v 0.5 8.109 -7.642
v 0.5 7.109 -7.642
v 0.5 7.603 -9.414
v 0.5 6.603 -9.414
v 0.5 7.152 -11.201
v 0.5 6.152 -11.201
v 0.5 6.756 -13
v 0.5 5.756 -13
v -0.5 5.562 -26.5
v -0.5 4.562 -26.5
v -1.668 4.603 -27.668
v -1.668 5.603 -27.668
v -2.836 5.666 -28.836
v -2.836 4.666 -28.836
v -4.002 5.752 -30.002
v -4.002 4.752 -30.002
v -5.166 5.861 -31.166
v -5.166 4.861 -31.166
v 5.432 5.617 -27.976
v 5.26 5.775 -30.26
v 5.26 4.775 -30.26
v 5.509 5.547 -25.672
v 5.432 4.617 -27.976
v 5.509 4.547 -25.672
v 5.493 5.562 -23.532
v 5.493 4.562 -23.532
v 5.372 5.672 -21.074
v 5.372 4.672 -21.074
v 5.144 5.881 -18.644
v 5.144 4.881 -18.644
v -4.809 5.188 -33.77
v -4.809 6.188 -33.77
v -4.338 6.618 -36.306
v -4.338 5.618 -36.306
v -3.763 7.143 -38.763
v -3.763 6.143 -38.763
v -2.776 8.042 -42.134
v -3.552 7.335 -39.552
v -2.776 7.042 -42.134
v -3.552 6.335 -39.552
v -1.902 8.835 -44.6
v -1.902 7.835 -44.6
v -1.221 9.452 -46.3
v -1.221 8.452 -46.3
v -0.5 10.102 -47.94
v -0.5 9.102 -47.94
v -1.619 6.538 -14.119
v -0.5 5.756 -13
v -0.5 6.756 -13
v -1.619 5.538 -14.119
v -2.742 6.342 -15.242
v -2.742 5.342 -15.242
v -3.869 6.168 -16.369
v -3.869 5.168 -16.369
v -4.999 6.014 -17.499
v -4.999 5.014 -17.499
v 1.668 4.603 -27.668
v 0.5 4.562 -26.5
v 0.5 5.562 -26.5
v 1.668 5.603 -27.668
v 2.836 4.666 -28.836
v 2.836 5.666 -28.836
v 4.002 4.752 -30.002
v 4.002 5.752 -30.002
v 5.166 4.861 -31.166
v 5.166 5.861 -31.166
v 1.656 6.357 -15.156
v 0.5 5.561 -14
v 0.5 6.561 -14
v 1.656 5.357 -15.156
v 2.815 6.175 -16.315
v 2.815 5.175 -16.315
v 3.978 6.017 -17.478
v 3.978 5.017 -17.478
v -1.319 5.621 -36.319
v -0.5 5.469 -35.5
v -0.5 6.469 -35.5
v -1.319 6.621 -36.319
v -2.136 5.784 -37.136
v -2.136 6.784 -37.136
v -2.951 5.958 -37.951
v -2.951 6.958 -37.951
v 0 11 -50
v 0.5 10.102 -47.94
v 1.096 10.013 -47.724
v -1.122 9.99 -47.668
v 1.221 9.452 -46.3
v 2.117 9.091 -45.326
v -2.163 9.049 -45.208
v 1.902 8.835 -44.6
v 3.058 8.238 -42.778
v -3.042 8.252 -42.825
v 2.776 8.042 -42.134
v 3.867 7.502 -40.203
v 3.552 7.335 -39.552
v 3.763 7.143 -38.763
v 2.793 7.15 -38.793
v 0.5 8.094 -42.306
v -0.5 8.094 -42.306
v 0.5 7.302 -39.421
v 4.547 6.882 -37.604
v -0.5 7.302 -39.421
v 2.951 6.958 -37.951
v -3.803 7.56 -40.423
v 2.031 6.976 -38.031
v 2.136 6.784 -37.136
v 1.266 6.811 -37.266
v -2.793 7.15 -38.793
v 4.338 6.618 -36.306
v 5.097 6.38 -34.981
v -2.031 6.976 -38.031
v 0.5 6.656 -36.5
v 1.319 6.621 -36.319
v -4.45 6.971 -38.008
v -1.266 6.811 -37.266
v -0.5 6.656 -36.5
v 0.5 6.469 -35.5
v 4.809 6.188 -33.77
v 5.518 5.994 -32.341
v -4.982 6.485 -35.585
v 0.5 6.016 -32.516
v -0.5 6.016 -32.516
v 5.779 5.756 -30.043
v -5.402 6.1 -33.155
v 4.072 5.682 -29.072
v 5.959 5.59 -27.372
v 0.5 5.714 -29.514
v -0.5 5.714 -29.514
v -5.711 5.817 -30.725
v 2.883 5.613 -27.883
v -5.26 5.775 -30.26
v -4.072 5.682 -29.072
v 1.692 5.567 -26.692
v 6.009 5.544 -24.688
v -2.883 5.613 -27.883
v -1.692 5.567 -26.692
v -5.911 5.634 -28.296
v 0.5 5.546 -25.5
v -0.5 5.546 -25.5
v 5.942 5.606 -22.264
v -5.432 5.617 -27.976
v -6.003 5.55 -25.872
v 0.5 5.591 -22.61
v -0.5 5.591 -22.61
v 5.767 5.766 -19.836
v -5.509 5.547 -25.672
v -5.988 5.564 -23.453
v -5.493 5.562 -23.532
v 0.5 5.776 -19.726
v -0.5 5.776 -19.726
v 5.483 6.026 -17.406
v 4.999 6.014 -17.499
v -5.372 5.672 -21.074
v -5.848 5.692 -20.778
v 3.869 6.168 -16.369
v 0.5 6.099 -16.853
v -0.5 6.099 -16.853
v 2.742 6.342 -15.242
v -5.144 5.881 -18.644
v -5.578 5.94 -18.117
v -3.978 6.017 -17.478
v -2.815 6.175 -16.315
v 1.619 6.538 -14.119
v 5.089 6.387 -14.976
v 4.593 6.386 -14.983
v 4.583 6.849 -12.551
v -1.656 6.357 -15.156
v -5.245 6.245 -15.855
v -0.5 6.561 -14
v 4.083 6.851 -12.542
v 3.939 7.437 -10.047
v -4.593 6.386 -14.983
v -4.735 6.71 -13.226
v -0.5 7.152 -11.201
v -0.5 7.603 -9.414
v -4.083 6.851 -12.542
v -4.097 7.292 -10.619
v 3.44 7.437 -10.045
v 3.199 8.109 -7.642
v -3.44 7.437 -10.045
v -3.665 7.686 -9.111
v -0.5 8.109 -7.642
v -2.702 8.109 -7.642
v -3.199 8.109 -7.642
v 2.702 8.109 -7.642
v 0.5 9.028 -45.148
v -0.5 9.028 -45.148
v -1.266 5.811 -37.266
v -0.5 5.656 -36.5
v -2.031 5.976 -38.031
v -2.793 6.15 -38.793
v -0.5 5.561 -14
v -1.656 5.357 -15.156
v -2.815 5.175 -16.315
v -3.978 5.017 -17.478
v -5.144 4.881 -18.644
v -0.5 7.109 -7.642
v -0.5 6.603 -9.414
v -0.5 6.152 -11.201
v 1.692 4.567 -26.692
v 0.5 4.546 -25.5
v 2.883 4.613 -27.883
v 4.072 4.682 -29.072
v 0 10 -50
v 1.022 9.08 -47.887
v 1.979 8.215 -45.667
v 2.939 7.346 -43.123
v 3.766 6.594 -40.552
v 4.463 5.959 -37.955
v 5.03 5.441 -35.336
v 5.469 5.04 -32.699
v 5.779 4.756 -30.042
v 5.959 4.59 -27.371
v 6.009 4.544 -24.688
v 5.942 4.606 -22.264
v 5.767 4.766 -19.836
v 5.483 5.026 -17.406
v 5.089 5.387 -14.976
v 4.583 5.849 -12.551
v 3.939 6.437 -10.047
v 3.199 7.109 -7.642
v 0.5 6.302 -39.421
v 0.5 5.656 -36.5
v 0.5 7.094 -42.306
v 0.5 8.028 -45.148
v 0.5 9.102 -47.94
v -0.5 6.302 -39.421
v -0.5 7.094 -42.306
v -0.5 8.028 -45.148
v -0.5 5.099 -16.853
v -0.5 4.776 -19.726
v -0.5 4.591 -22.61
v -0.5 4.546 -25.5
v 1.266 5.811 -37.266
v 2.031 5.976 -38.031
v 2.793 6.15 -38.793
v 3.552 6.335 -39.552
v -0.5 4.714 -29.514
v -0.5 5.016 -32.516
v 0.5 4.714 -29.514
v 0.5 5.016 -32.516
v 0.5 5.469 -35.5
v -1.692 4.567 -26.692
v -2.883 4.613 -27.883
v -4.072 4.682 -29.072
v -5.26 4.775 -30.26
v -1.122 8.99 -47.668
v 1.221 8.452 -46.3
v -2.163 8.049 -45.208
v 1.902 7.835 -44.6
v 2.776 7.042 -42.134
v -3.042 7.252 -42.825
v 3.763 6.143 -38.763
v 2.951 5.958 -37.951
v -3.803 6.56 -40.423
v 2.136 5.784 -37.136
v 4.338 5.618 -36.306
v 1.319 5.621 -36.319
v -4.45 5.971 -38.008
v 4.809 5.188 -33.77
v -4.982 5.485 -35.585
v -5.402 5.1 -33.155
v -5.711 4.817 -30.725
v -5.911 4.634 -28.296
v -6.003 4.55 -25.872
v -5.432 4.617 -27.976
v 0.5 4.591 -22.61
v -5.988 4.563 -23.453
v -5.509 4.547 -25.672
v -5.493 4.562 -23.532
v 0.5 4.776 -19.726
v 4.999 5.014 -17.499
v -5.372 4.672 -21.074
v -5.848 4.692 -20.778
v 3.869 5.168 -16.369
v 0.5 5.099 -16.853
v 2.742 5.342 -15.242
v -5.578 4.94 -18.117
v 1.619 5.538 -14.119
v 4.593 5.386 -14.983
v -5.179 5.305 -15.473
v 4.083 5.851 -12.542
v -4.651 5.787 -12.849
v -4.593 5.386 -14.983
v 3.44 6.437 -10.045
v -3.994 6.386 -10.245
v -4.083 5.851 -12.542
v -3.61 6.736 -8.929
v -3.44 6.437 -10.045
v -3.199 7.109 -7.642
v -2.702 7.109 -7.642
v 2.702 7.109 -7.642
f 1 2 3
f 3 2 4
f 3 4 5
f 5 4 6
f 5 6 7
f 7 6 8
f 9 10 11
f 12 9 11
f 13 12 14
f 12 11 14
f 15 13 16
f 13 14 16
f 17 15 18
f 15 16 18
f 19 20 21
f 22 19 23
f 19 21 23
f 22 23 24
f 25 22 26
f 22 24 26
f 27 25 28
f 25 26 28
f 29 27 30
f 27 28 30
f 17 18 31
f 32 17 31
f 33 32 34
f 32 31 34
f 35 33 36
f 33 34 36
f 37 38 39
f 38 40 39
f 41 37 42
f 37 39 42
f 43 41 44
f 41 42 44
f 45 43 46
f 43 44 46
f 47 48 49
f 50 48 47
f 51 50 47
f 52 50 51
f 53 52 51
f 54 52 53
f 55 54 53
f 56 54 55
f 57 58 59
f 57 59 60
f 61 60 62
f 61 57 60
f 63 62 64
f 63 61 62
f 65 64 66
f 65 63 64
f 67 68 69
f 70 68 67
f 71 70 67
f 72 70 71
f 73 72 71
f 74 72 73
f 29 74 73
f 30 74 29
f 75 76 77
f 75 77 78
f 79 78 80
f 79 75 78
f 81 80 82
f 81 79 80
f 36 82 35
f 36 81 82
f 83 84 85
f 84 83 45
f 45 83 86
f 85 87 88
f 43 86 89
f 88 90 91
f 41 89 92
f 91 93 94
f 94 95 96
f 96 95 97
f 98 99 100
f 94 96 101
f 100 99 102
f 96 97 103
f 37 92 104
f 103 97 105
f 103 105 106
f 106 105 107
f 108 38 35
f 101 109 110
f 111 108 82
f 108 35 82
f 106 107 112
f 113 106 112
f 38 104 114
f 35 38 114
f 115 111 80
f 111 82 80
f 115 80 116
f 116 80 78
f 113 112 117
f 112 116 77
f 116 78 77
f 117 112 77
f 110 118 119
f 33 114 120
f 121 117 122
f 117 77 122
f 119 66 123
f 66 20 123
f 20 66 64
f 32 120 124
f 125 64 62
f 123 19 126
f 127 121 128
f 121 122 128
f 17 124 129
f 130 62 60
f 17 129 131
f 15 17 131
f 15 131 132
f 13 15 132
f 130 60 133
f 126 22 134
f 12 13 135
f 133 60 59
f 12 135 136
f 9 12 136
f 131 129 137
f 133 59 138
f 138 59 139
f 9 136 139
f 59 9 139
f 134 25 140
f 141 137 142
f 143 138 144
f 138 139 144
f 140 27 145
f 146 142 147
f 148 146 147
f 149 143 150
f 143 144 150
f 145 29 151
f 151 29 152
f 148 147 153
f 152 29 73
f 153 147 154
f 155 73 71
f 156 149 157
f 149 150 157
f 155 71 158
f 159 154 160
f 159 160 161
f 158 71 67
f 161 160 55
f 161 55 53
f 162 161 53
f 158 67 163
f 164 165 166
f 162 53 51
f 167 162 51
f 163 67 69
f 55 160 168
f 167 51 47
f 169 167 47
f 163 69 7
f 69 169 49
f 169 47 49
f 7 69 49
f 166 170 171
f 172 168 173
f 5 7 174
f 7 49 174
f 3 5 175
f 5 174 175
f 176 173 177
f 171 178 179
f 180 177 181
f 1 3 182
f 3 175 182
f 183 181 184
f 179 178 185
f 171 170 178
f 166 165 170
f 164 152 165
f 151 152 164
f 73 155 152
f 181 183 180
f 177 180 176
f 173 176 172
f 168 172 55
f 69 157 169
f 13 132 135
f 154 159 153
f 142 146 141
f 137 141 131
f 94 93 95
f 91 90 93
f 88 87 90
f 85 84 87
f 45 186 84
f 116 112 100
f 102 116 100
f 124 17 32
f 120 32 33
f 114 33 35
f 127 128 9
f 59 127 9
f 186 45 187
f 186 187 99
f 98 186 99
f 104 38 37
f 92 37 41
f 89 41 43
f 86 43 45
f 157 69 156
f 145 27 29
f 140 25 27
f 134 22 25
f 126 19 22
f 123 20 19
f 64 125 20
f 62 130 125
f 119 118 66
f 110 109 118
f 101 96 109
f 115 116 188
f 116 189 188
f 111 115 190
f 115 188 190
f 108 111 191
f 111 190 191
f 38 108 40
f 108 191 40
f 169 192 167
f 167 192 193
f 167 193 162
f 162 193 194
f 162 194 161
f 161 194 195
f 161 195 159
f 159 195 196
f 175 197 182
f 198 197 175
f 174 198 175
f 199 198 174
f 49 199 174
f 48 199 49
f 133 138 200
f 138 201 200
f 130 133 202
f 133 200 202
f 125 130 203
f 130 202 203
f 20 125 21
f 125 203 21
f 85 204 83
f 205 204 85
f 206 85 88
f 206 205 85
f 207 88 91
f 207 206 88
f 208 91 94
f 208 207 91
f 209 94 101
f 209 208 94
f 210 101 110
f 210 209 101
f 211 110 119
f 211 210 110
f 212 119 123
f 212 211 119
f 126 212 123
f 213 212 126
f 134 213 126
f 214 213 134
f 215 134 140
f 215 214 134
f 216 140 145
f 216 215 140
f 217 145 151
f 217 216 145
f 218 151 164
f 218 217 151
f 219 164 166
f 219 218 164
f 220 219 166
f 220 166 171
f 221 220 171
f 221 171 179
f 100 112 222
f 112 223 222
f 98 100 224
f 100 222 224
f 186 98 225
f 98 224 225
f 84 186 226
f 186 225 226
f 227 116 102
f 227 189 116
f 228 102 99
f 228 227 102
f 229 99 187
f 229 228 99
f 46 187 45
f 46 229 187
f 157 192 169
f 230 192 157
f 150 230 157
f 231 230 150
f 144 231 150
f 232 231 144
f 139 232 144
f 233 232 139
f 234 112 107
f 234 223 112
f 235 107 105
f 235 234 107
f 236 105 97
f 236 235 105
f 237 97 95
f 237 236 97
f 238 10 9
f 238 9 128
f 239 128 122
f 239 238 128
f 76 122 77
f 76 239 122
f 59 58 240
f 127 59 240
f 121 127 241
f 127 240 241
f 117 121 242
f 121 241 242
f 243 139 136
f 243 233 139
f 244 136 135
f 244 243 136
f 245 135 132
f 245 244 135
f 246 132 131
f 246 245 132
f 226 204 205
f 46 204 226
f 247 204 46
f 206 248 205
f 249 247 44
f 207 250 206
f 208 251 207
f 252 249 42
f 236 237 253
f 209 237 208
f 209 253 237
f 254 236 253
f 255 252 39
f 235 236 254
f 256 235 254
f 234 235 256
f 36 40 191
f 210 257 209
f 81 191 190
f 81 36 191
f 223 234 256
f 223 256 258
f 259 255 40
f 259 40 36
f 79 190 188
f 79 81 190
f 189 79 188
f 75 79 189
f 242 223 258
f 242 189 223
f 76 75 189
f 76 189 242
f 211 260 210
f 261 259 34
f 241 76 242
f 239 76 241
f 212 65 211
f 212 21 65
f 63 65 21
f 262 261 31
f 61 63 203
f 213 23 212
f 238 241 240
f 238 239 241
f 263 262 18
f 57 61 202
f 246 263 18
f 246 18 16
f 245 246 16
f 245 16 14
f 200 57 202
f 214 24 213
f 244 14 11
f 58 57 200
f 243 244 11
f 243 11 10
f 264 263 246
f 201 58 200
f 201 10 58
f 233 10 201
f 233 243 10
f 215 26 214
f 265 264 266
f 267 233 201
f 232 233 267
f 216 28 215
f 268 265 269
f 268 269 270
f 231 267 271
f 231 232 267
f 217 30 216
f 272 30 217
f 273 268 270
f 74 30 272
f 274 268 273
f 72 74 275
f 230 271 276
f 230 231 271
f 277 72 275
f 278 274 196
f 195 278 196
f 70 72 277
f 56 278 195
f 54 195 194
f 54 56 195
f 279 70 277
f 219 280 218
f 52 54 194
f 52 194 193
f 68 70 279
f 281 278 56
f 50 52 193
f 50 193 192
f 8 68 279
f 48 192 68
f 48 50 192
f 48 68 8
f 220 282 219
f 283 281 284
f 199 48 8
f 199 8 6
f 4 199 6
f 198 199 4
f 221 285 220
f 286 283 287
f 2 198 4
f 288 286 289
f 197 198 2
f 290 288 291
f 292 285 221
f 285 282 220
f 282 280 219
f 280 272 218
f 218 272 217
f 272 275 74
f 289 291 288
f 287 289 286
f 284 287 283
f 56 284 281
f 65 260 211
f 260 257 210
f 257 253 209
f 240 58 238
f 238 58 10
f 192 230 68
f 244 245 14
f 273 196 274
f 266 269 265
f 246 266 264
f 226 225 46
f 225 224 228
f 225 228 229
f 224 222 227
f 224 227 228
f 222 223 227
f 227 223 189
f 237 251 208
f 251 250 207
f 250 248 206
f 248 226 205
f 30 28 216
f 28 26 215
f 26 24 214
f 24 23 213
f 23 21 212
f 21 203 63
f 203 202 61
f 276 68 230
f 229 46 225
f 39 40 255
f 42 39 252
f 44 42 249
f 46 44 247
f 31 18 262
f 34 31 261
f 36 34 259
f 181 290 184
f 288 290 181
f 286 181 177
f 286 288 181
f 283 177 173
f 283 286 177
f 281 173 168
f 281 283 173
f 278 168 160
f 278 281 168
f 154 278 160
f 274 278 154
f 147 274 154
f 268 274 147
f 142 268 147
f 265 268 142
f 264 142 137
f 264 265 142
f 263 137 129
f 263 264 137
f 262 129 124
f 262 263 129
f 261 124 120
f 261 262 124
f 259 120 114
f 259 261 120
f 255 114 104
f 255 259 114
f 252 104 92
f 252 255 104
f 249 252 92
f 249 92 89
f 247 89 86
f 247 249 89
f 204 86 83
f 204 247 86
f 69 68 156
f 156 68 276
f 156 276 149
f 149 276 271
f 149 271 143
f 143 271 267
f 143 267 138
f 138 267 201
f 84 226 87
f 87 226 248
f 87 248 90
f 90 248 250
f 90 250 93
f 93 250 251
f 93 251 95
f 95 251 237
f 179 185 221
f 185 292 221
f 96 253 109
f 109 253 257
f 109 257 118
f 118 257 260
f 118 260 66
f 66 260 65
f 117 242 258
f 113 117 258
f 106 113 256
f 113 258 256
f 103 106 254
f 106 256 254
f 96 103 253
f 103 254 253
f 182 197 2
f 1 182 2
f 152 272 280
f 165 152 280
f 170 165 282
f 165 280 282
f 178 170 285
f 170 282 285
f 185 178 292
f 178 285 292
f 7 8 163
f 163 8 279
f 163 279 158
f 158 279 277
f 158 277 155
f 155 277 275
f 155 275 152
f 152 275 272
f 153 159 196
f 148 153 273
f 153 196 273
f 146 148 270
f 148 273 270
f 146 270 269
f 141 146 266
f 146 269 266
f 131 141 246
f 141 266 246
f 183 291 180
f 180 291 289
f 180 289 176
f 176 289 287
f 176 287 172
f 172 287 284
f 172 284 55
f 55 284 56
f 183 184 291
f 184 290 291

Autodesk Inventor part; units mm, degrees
ref_plane "YZ Plane" through (0, 0, 0) normal (1, 0, 0) x (0, 1, 0)
ref_plane "XZ Plane" through (0, 0, 0) normal (0, 1, 0) x (-1, 0, 0)
ref_plane "XY Plane" through (0, 0, 0) normal (0, 0, 1) x (1, 0, 0)
sketch "Sketch1" plane through (0, 0, 0) normal (0, 1, 0) x (-1, 0, 0)
  arc A0 (0, -50) -> (0, 0) centre (-48.9898, -25) ccw
  arc A1 (0, -49) -> (0, -1) centre (-49.4874, -25) ccw
  line L0 (0, 0) -> (0, -50)
  line L1 (0, -12.5) -> (5.5721, -18.0721)
  line L2 (0, -12.5) -> (7.8802, -12.5) construction
  line L3 (0, -13.5) -> (5.704, -19.204)
  line L4 (0, -25) -> (5.7127, -30.7127)
  line L5 (0, -25) -> (8.079, -25) construction
  line L6 (0, -26) -> (5.6114, -31.6114)
  line L7 (0, -35) -> (4.157, -39.157)
  line L8 (0, -35) -> (5.8789, -35) construction
  line L9 (0, -36) -> (3.9417, -39.9417)
  arc A2 (0, 0) -> (0, -50) centre (48.9898, -25) ccw
  arc A3 (0, -1) -> (0, -49) centre (49.4874, -25) ccw
  line L10 (0, -12.5) -> (-5.5721, -18.0721)
  line L11 (0, -13.5) -> (-5.704, -19.204)
  line L12 (0, -25) -> (-5.7127, -30.7127)
  line L13 (0, -26) -> (-5.6114, -31.6114)
  line L14 (0, -35) -> (-4.157, -39.157)
  line L15 (0, -36) -> (-3.9417, -39.9417)
  line L16 (0.5, 0) -> (0.5, -50.0047)
  line L17 (-0.5, 0) -> (-0.5, -50.0047)
  point P0 (5.1659, -31.1659)
  point P1 (3.7628, -38.7628)
  point P2 (0.5, -35.5)
  point P3 (0.5, -26.5)
  point P4 (-3.7628, -38.7628)
  point P5 (-5.1659, -31.1659)
  point P6 (-0.5, -26.5)
  point P7 (-0.5, -35.5)
  point P8 (-5.2605, -30.2605)
  point P9 (-5.1441, -18.6441)
  point P10 (-0.5, -14)
  point P11 (-0.5, -25.5)
  point P12 (-4.9987, -17.4987)
  point P13 (-0.5, -2.0596)
  point P14 (-0.5, -13)
  point P15 (-0.5, -36.5)
  point P16 (-0.5, -47.9404)
  point P17 (-3.5525, -39.5525)
  point P18 (4.9987, -17.4987)
  point P19 (0.5, -13)
  point P20 (0.5, -2.0596)
  point P21 (3.5525, -39.5525)
  point P22 (0.5, -47.9404)
  point P23 (0.5, -36.5)
  point P24 (5.1441, -18.6441)
  point P25 (5.2605, -30.2605)
  point P26 (0.5, -25.5)
  point P27 (0.5, -14)
  dimension "d0" = 50
  dimension "d1" = 55
  dimension "d2" = 48
  dimension "d3" = 55
  dimension "d4" = 45
  dimension "d5" = 45
  dimension "d6" = 45
extrude "Extrusion1" add sketch "Sketch1" along normal blind 20 contours L9 A1 L7 A0 | A0 L16 A1 L9 | L7 A1 L6 A0 | A0 L0 A1 L16 | L9 L16 L7 A1 | L6 A1 L4 A0 | A2 L17 A3 L0 | A1 L0 L9 L16 | L9 L0 L7 L16 | L4 A1 L3 A0 | L6 L16 L4 A1 | L7 L0 L6 L16 | A3 L17 L15 L0 | A2 L15 A3 L17 | L15 L17 L14 L0 | L3 A1 L1 A0 | L6 L0 L4 L16 | L14 L17 L13 L0 | A2 L14 A3 L15 | L15 A3 L14 L17 | L1 A1 L16 A0 | L3 L16 L1 A1 | L4 L0 L3 L16 | L13 L17 L12 L0 | A2 L13 A3 L14 | L16 A1 L0 A0 | L3 L0 L1 L16 | L12 L17 L11 L0 | L13 A3 L12 L17 | A2 L12 A3 L13 | L0 A3 L17 A2 | L16 L1 L0 A1 | L11 L17 L10 L0 | A2 L11 A3 L12 | L0 L10 L17 A3 | L17 A3 L10 A2 | L11 A3 L10 L17 | A2 L10 A3 L11
sketch "Sketch2" plane through (0, 0, 0) normal (0, 0, 1) x (1, 0, 0)
  point P0 (0, 0)
sketch "Sketch3" plane through (0, 0, 0) normal (1, 0, 0) x (0, 1, 0)
  line L0 (0, 0) -> (20, 0) projected
  line L1 (0, -50) -> (20, -50) projected
  arc A0 (10, 0) -> (10, -50) centre (64.5436, -25) ccw
  arc A1 (11, 0) -> (11, -50) centre (65.5436, -25) ccw
  line L2 (11, 0) -> (11, -50) construction
  line L3 (11, 0) -> (61, 0) construction
  line L4 (11, 0) -> (20, 0)
  line L5 (20, -50) -> (20, 0) projected
  line L6 (20, 0) -> (20, -50)
  line L7 (20, -50) -> (11, -50)
  line L8 (10, 0) -> (0, 0)
  line L9 (0, 0) -> (0, -50)
  line L10 (10, -50) -> (0, -50)
  point P0 (11, 0)
  point P1 (11, -50)
  dimension "d9" = 60
  dimension "d10" = 50
  dimension "d11" = 90
  dimension "d12" = 60
extrude "Extrusion2" cut sketch "Sketch3" along normal mid plane 20 contours L0 A0 L1 L9 | L0 L5 L1 A1
sketch "Sketch4" plane through (0, 0, 0) normal (0, 1, 0) x (-1, 0, 0)
  line L0 (5.7236, -7.6424) -> (-5.525, -7.6424)
  line L1 (-5.525, -7.6424) -> (-5.525, 3.7385)
  line L2 (-5.525, 3.7385) -> (5.7236, 3.7385)
  line L3 (5.7236, 3.7385) -> (5.7236, -7.6424)
  point P0 (0, 0)
extrude "Extrusion3" cut sketch "Sketch4" along normal blind 15
